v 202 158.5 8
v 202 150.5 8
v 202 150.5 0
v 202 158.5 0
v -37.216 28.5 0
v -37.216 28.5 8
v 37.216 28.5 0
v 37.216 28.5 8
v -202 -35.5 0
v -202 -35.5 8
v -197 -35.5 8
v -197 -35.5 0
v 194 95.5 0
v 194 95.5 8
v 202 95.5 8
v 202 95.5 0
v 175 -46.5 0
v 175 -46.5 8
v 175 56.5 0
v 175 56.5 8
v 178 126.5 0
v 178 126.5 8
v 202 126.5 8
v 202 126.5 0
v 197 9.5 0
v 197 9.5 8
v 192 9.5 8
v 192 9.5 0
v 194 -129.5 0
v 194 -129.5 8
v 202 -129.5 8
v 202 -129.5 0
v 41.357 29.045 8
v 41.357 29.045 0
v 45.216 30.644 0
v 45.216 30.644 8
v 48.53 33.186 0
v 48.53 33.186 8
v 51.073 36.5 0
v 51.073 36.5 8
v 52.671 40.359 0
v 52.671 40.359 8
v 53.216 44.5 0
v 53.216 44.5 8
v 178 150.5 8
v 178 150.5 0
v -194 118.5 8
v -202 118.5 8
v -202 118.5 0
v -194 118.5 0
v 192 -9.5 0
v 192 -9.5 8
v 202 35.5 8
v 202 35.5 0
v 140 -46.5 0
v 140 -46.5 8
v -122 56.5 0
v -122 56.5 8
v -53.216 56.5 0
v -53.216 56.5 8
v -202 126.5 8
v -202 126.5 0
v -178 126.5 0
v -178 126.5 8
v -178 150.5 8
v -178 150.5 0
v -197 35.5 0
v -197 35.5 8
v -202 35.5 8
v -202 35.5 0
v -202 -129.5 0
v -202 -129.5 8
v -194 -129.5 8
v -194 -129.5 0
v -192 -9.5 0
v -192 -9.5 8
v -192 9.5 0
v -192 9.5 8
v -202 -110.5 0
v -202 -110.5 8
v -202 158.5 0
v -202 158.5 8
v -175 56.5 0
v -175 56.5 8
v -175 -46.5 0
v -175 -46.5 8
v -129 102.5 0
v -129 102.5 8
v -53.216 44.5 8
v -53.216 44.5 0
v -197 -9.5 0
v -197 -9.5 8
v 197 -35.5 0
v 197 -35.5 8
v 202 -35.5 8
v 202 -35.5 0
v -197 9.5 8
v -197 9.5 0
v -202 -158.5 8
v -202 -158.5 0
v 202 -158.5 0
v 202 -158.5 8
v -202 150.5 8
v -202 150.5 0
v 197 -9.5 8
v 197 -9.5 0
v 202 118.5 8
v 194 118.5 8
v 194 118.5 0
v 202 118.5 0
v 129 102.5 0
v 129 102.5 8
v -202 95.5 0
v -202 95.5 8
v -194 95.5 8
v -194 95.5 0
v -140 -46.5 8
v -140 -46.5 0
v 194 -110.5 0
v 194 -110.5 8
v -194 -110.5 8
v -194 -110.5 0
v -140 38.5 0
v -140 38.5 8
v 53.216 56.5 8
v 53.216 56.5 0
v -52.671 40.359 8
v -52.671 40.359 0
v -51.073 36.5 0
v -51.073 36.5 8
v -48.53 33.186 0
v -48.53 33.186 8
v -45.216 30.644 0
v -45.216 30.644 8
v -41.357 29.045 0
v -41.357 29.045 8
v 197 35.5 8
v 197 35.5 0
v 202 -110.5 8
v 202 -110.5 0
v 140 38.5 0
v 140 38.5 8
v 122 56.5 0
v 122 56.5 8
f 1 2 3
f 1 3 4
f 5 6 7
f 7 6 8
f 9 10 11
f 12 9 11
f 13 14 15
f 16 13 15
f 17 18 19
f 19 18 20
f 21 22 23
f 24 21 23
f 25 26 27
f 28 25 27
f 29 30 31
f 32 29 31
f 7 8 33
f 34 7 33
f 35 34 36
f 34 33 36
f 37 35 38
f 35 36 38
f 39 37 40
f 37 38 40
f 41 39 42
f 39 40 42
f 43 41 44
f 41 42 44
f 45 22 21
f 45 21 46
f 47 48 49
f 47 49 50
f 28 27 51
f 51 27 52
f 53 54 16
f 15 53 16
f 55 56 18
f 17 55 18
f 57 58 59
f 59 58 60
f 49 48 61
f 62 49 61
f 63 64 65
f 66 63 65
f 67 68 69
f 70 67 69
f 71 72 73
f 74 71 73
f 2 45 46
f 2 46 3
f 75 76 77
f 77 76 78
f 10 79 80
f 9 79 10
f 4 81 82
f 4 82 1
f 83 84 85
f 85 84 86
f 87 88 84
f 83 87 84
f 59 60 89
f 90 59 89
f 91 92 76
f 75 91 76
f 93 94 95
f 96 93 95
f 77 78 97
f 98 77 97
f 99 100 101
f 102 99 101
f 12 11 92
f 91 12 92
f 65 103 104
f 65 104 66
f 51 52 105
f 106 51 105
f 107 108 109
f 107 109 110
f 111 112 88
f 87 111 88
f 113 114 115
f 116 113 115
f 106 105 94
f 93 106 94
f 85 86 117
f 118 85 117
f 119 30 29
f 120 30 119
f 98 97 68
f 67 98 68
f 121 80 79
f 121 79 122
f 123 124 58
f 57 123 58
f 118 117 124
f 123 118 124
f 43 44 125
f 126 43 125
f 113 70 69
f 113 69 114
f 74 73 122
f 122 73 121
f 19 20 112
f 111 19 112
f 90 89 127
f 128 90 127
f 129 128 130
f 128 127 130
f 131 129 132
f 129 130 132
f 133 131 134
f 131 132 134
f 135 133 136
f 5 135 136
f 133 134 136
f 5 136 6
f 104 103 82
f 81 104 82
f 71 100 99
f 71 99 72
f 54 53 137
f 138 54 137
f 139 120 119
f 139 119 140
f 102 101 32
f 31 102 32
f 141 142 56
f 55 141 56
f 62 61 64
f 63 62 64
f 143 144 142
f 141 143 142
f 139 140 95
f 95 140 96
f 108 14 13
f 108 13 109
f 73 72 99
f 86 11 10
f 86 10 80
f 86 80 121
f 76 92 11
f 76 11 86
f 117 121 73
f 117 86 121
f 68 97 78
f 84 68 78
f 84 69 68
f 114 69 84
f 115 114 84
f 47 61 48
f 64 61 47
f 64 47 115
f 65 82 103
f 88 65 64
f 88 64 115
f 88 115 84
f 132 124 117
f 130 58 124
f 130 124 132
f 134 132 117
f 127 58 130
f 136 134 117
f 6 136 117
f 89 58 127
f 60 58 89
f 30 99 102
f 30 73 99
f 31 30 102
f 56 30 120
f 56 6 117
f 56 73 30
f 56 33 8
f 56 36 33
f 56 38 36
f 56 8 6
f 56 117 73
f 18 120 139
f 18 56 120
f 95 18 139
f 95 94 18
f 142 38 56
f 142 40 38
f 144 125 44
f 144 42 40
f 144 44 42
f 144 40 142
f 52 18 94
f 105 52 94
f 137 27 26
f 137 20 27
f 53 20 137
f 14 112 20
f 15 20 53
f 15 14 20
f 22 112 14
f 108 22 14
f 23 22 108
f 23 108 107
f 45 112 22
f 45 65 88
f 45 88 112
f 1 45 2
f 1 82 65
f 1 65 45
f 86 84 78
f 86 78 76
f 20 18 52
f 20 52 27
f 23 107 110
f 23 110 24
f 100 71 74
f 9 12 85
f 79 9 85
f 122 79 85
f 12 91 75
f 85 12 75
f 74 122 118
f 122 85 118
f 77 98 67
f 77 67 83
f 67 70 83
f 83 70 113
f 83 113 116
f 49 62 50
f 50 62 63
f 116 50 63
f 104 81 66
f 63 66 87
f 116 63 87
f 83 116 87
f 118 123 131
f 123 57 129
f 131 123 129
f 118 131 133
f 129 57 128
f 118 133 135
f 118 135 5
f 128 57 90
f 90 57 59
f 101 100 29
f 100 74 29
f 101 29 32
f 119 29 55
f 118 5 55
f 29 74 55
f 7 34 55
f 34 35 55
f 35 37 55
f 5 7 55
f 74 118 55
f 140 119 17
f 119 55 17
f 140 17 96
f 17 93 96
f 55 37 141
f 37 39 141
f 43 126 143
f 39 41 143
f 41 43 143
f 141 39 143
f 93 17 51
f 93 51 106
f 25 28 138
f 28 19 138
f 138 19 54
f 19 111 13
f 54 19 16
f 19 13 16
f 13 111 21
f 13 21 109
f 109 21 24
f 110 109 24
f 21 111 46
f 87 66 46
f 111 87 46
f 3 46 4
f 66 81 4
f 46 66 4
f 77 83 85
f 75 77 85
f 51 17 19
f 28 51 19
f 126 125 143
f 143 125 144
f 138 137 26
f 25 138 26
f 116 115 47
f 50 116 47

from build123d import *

# Parameters (mm, degrees)
F0_W     = 404
F0_H     = 317
F1_DEPTH = 8
F2_W     = 8
F2_H     = 19
F2_H_2   = 23
F2_W_2   = 24
F2_H_3   = 24
F3_DEPTH = 8
F5_DEPTH = 8.001


with BuildPart() as f1:
    # F0 (on Top) → F1 (new body)
    with BuildSketch(Plane.XY):
        Rectangle(F0_W, F0_H)
    extrude(amount=F1_DEPTH)

    # F2 (on face) → F3 (cut)
    with BuildSketch(Plane.XY.offset(8)):
        with Locations((-198, -120)):
            Rectangle(F2_W, F2_H)
        Polygon((-202, 35.5), (-202, -35.5), (-197, -35.5), (-197, -9.5), (-192, -9.5), (-192, 9.5), (-197, 9.5), (-197, 35.5), align=None)
        with Locations((-198, 107)):
            Rectangle(F2_W, F2_H_2)
        with Locations((-190, 138.5)):
            Rectangle(F2_W_2, F2_H_3)
        Polygon((192, -9.5), (197, -9.5), (197, -35.5), (202, -35.5), (202, 35.5), (197, 35.5), (197, 9.5), (192, 9.5), align=None)
        with Locations((198, -120)):
            Rectangle(F2_W, F2_H)
        with Locations((198, 107)):
            Rectangle(F2_W, F2_H_2)
        with Locations((190, 138.5)):
            Rectangle(F2_W_2, F2_H_3)
    extrude(amount=-F3_DEPTH, mode=Mode.SUBTRACT)

    # F4 (on face) → F5 (cut, through all)
    with BuildSketch(Plane.XY.offset(8)):
        with BuildLine():
            Line((-175, 56.5), (-175, -46.5))
            Line((-175, -46.5), (-140, -46.5))
            Line((-140, -46.5), (-140, 38.5))
            Line((-140, 38.5), (-122, 56.5))
            Line((-122, 56.5), (-53.216133, 56.5))
            Line((-53.216133, 56.5), (-53.216133, 44.5))
            ThreePointArc((-53.216133, 44.5), (-48.529842, 33.186292), (-37.216133, 28.5))
            Line((-37.216133, 28.5), (37.216133, 28.5))
            ThreePointArc((37.216133, 28.5), (48.529842, 33.186292), (53.216133, 44.5))
            Line((53.216133, 44.5), (53.216133, 56.5))
            Line((53.216133, 56.5), (122, 56.5))
            Line((122, 56.5), (140, 38.5))
            Line((140, 38.5), (140, -46.5))
            Line((140, -46.5), (175, -46.5))
            Line((175, -46.5), (175, 56.5))
            Line((175, 56.5), (129, 102.5))
            Line((129, 102.5), (-129, 102.5))
            Line((-129, 102.5), (-175, 56.5))
        make_face()
    extrude(amount=-F5_DEPTH, mode=Mode.SUBTRACT)


solid = f1.part
